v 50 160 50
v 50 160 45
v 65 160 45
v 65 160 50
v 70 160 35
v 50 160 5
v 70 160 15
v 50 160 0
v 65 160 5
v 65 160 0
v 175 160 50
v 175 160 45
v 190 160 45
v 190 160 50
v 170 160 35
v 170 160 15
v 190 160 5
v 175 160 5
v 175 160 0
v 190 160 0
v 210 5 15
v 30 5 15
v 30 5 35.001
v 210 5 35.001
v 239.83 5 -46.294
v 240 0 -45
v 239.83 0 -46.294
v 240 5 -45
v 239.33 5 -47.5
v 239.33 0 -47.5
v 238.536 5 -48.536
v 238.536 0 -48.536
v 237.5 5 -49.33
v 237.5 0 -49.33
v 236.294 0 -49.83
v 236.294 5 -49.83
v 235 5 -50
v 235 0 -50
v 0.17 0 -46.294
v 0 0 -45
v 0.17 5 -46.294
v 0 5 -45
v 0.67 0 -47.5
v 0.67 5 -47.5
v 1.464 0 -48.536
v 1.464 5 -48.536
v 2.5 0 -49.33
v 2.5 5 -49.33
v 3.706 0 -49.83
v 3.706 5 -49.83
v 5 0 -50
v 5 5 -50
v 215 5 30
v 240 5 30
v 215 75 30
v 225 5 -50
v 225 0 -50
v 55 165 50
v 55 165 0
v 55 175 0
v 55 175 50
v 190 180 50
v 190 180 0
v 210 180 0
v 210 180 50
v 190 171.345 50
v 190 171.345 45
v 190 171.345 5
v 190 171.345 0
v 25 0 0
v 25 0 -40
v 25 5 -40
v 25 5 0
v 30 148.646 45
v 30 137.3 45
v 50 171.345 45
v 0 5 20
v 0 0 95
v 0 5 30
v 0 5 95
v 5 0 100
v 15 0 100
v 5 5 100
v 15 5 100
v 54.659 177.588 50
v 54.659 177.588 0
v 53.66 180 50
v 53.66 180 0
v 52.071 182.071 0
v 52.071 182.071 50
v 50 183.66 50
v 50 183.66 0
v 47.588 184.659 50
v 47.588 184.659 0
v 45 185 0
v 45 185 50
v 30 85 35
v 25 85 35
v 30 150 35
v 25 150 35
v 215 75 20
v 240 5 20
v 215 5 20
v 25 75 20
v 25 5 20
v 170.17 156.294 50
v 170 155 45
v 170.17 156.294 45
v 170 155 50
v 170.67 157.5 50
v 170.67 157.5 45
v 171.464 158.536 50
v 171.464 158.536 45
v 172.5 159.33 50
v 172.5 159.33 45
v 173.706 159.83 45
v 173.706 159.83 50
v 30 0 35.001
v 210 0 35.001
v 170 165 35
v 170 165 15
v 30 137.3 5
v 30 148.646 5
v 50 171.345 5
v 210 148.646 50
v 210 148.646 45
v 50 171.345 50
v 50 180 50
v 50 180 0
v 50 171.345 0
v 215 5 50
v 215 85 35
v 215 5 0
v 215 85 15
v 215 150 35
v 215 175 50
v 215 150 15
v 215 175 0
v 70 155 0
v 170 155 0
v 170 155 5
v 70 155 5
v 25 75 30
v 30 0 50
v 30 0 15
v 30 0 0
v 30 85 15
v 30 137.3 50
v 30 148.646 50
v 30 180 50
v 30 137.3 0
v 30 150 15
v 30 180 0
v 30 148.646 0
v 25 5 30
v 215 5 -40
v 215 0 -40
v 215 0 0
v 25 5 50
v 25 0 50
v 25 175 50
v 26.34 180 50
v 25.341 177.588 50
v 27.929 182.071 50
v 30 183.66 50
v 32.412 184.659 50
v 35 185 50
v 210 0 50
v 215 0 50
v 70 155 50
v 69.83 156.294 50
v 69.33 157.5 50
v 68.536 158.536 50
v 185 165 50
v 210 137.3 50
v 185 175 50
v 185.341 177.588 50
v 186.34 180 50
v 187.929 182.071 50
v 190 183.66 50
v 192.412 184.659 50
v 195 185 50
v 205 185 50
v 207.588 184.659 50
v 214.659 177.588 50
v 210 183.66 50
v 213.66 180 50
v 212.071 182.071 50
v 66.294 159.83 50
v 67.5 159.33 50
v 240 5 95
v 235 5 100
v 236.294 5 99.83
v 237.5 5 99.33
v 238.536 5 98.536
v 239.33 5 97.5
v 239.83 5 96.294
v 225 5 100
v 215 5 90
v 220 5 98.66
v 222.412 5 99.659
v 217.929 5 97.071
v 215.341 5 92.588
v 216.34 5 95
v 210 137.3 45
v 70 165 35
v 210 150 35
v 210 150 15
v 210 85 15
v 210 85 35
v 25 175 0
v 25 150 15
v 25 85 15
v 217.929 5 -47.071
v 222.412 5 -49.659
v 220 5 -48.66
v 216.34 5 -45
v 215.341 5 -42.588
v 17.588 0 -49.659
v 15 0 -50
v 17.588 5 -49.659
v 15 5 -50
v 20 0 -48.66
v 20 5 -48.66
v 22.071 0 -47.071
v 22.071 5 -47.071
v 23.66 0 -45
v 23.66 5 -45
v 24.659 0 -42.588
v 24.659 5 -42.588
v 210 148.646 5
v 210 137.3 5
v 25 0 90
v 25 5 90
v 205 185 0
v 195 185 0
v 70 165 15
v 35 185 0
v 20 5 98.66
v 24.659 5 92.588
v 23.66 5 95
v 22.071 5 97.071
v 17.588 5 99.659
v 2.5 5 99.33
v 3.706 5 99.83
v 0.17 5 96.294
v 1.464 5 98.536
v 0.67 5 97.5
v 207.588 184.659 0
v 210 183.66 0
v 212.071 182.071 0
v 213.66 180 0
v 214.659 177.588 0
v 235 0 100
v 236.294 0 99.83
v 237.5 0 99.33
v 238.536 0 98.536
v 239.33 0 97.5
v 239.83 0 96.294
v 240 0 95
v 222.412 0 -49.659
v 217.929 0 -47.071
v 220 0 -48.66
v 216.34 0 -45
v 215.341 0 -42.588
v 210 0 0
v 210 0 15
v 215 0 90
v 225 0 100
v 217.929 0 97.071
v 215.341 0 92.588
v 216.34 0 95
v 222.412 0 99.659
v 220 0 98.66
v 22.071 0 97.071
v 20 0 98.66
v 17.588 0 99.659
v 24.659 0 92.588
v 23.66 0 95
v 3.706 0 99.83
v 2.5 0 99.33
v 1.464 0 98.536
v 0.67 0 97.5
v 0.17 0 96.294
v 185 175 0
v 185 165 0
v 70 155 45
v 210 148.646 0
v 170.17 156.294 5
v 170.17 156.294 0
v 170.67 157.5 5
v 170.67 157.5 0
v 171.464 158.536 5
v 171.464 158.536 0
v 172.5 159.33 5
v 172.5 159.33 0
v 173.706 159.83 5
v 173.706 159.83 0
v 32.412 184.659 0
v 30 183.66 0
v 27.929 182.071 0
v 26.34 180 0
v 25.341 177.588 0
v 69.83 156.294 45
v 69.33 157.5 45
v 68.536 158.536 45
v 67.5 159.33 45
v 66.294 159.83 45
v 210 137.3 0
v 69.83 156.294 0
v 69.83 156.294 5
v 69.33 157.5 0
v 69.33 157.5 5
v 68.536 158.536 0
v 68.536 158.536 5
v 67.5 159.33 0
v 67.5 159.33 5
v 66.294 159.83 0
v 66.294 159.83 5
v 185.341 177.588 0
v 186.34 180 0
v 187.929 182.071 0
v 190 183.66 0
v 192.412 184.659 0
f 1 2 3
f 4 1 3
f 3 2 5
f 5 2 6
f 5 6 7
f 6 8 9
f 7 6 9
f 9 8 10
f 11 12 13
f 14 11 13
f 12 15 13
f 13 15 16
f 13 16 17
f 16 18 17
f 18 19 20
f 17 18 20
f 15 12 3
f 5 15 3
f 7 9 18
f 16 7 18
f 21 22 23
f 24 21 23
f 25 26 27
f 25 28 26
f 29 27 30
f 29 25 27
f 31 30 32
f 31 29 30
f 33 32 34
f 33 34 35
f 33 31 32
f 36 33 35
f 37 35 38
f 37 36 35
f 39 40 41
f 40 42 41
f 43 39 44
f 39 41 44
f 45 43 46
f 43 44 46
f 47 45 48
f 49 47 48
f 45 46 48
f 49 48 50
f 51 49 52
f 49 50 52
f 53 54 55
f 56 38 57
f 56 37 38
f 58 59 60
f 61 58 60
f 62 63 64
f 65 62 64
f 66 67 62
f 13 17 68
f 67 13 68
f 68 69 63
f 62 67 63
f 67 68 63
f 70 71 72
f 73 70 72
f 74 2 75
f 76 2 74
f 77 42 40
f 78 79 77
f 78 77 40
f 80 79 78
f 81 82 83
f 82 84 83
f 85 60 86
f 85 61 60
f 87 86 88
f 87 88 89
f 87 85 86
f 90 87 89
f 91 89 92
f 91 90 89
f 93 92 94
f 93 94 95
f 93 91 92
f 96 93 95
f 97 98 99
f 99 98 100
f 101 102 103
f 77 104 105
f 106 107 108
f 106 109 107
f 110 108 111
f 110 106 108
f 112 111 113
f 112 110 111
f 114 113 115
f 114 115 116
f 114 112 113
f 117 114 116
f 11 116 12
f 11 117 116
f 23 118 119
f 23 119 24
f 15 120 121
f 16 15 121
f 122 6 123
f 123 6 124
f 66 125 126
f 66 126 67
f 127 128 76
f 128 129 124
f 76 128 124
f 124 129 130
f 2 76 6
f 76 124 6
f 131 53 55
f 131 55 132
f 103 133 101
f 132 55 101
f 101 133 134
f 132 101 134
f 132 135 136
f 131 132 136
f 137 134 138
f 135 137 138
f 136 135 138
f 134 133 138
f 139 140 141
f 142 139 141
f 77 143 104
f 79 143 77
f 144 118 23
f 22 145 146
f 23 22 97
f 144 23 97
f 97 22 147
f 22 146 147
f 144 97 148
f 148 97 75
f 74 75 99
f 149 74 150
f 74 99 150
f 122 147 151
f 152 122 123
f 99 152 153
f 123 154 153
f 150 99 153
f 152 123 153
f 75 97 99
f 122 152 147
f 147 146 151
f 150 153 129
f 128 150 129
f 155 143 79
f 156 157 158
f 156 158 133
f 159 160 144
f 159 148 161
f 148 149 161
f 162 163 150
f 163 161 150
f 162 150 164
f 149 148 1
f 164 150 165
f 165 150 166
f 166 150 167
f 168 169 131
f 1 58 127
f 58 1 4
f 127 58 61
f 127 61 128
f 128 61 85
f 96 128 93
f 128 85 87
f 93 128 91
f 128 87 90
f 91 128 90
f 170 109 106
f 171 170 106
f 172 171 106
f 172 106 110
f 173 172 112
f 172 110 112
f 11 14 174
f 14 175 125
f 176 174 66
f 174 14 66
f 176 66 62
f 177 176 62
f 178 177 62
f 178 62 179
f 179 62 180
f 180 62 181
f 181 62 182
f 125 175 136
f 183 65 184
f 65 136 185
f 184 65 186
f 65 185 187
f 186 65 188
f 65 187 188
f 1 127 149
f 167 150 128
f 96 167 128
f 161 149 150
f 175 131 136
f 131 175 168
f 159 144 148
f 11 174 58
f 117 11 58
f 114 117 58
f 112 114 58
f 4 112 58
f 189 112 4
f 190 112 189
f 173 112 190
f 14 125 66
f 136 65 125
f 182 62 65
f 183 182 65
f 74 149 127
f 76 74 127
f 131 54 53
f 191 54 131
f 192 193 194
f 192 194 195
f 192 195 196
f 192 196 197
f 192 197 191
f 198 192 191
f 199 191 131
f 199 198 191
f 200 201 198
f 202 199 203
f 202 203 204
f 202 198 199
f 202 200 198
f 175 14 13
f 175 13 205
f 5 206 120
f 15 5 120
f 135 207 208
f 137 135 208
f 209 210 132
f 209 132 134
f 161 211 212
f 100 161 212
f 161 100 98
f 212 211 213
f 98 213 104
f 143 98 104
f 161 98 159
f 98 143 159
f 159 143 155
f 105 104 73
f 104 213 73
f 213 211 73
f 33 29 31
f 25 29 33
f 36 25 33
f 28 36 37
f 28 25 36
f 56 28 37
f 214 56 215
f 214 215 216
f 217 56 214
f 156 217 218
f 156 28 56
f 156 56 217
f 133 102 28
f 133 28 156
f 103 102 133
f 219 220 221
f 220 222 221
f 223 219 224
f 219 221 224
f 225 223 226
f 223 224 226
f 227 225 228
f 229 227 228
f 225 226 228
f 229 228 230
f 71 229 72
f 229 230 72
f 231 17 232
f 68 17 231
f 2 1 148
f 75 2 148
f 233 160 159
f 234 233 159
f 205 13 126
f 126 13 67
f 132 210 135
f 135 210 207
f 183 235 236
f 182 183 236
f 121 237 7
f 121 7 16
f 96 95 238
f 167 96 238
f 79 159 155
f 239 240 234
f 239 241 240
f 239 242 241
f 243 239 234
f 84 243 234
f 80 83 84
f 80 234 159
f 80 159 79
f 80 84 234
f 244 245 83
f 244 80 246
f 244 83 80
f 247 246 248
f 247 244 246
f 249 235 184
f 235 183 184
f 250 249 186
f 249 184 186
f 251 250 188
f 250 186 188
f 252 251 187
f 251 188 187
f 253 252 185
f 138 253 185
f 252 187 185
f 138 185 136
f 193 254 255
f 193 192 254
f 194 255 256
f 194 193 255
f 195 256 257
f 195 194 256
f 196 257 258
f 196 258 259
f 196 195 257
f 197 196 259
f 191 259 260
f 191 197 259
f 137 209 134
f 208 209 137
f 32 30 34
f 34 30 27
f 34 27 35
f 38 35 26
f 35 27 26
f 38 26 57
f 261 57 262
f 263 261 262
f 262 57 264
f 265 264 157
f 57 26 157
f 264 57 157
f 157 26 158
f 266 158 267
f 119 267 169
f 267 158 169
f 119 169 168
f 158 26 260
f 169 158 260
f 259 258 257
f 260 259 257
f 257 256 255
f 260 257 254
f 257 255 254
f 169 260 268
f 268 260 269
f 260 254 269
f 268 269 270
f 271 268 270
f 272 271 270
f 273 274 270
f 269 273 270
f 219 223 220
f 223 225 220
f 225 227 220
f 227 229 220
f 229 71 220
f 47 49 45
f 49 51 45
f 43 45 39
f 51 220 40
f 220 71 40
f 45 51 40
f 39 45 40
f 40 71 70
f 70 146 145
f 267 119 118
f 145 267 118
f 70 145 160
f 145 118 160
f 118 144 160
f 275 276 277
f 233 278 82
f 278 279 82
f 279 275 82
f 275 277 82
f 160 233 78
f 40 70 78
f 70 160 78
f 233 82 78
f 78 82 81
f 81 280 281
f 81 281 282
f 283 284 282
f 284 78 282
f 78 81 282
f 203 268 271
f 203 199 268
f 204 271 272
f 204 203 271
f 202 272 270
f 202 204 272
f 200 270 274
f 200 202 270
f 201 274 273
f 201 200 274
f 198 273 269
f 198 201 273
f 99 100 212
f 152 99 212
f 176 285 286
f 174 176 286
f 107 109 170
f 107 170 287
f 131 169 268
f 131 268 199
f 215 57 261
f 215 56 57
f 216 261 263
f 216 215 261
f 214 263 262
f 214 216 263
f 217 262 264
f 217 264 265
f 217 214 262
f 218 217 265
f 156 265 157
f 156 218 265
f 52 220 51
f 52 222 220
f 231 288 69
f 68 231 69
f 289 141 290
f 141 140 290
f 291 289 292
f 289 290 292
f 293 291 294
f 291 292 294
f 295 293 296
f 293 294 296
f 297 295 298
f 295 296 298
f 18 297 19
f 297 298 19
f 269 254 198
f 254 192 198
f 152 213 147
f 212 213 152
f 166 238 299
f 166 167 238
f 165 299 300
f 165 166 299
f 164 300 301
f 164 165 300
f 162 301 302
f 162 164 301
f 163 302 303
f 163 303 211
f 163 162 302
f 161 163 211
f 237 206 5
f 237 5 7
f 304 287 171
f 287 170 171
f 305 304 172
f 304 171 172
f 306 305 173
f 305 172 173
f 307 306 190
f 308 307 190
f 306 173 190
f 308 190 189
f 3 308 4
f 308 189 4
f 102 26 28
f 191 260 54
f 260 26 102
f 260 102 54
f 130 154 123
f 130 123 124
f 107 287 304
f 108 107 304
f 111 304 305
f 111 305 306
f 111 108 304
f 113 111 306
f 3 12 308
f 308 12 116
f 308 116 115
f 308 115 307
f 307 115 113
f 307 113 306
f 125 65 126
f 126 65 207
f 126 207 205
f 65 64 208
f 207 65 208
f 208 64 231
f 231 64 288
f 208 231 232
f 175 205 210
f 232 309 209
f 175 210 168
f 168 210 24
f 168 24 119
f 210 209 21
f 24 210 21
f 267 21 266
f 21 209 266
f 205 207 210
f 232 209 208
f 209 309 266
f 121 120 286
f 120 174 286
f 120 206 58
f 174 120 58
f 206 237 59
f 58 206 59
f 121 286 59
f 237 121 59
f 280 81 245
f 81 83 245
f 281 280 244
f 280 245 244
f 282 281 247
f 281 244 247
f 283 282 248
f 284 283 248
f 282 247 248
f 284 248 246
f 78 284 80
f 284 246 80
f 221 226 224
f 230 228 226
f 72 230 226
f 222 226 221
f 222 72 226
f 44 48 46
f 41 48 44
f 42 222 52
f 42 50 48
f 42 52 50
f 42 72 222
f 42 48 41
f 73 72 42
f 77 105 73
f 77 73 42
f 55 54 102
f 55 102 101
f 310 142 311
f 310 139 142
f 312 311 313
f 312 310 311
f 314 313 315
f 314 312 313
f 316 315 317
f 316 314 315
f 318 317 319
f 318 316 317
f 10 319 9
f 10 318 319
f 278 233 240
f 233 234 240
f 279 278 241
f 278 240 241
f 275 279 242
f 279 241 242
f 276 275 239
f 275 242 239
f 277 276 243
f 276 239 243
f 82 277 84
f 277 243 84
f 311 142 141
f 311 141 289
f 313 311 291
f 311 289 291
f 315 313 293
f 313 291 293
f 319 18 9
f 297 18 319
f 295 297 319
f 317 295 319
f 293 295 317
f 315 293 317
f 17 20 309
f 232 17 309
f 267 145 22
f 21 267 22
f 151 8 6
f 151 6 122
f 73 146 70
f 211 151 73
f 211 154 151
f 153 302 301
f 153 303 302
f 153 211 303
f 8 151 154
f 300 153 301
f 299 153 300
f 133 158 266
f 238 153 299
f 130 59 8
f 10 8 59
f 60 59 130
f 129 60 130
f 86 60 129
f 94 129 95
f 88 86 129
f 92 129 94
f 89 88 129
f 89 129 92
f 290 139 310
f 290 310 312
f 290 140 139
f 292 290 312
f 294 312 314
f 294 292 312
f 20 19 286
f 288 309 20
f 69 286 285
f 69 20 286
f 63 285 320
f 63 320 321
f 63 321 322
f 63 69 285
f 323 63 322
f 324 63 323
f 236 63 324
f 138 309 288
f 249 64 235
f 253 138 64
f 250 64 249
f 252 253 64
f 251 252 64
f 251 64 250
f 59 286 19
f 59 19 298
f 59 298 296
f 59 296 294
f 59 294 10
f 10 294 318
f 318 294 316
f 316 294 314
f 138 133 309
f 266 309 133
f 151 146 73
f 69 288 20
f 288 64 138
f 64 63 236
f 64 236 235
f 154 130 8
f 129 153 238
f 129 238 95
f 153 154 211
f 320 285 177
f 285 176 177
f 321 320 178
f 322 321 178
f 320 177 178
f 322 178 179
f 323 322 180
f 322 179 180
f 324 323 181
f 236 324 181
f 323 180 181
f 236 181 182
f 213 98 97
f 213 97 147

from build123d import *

# Parameters (mm, degrees)
EXTRUDE_1_DEPTH             = 50
SKETCH_2_W                  = 20.000664015
SKETCH_2_H                  = 5
EXTRUDE_2_DEPTH             = 240
EXTRUDE_3_DEPTH             = 50
EXTRUDE_3_DEPTH_BACK        = 100
SKETCH_3_W                  = 25
SKETCH_3_H                  = 5
RIB_2_REACH                 = 314.17
SKETCH_4_WALL_W             = 700.669994888
SKETCH_4_WALL_H             = 10
RIB_3_REACH                 = 314.17
SKETCH_5_WALL_W             = 700.669994888
SKETCH_5_WALL_H             = 10
CUT_EXTRUDE_START           = -190
SKETCH_6_W                  = 20
SKETCH_6_H                  = 65
CUT_EXTRUDE_1_DEPTH         = 190
SKETCH_7_W                  = 100
SKETCH_7_H                  = 20
CUT_EXTRUDE_2_DEPTH         = 5
EXTRUDE_5_DEPTH             = 5
MIRROR_2_COPY_1_DEPTH       = 5
EXTRUDE_6_REACH             = 244.126
SKETCH_10_W                 = 5
SKETCH_10_H                 = 5
EXTRUDE_6_DIRECTION_2_REACH = 244.126
FILLET_1_R                  = 5
FILLET_2_R                  = 5
FILLET_3_R                  = 5
FILLET_4_R                  = 5
FILLET_5_R                  = 10
FILLET_6_R                  = 5


with BuildPart() as part:
    # 草图1 → 凸台-拉伸1 (new body)
    with BuildSketch(Plane.XY):
        Polygon((0, 0), (30, 0), (30, 180), (50, 180), (50, 160), (190, 160), (190, 180), (210, 180), (210, 0), (240, 0), (240, 5), (215, 5), (215, 185), (185, 185), (185, 165), (55, 165), (55, 185), (25, 185), (25, 5), (0, 5), align=None)
    extrude(amount=EXTRUDE_1_DEPTH)

    # 草图2 → 凸台-拉伸2 (add)
    with BuildSketch(Plane.ZY):
        with Locations((25.000332008, 2.5)):
            Rectangle(SKETCH_2_W, SKETCH_2_H)
    extrude(amount=-EXTRUDE_2_DEPTH)

    # 草图3 → 凸台-拉伸3 (add, two sides: drawn at the far end of the back side and taken through both)
    with BuildSketch(Plane(origin=(0, 0, 0), x_dir=(-1, 0, 0), z_dir=(0, 0, -1)).offset(-EXTRUDE_3_DEPTH_BACK)):
        with Locations((-227.5, 2.5)):
            Rectangle(SKETCH_3_W, SKETCH_3_H)
        with Locations((-12.5, 2.5)):
            Rectangle(SKETCH_3_W, SKETCH_3_H)
    extrude(amount=EXTRUDE_3_DEPTH + EXTRUDE_3_DEPTH_BACK)

    # 草图4 wall → 筋2 (add, up to next)
    with BuildSketch(Plane(origin=(227.5, 40, 25), x_dir=(-0.336336396998, 0.941741911595, 0), z_dir=(0.941741911595, 0.336336396998, 0)), mode=Mode.PRIVATE) as rib_2_sk1:
        Rectangle(SKETCH_4_WALL_W, SKETCH_4_WALL_H)
    rib_2_tool1 = extrude(rib_2_sk1.sketch, amount=-RIB_2_REACH, mode=Mode.PRIVATE) - part.part
    add(rib_2_tool1.solids().sort_by_distance((227.5, 40, 25))[0])

    # 草图5 wall → 筋3 (add, up to next)
    with BuildSketch(Plane(origin=(12.5, 40, 25), x_dir=(-0.336336396998, -0.941741911595, 0), z_dir=(-0.941741911595, 0.336336396998, 0)), mode=Mode.PRIVATE) as rib_3_sk1:
        Rectangle(SKETCH_5_WALL_W, SKETCH_5_WALL_H)
    rib_3_tool1 = extrude(rib_3_sk1.sketch, amount=-RIB_3_REACH, mode=Mode.PRIVATE) - part.part
    add(rib_3_tool1.solids().sort_by_distance((12.5, 40, 25))[0])

    # 草图6 → 切除-拉伸1 (cut)
    with BuildSketch(Plane(origin=(215, 0, 0), x_dir=(0, 0, -1), z_dir=(1, 0, 0)).offset(CUT_EXTRUDE_START)):
        with Locations((-25, 117.5)):
            Rectangle(SKETCH_6_W, SKETCH_6_H)
    extrude(amount=CUT_EXTRUDE_1_DEPTH, mode=Mode.SUBTRACT)

    # 草图7 → 切除-拉伸2 (cut)
    with BuildSketch(Plane(origin=(0, 165, 0), x_dir=(1, 0, 0), z_dir=(0, 1, 0))):
        with Locations((120, -25)):
            Rectangle(SKETCH_7_W, SKETCH_7_H)
    extrude(amount=-CUT_EXTRUDE_2_DEPTH, mode=Mode.SUBTRACT)

    # 草图9 → 凸台-拉伸5 (add)
    with BuildSketch(Plane(origin=(0, 0, 0), x_dir=(-1, 0, 0), z_dir=(0, 0, -1))):
        Polygon((-190, 160), (-210, 137.300480815), (-210, 148.645505565), (-190, 171.34502475), align=None)
    extrude_5 = extrude(amount=-EXTRUDE_5_DEPTH)

    # 镜向1: 凸台-拉伸5 across plane
    add(extrude_5.mirror(Plane(origin=(0, 0, 25), x_dir=(1, 0, 0), z_dir=(0, 0, -1))))

    # 镜向2: 凸台-拉伸5 across plane
    add(extrude_5.mirror(Plane(origin=(120, 0, 0), x_dir=(0, 0, 1), z_dir=(1, 0, 0))))

    # 镜向2 copy 1 sketch → 镜向2 copy 1 (add)
    with BuildSketch(Plane(origin=(240, 0, 50), x_dir=(1, 0, 0), z_dir=(0, 0, 1))):
        Polygon((-190, 160), (-210, 137.300480815), (-210, 148.645505565), (-190, 171.34502475), align=None)
    extrude(amount=-MIRROR_2_COPY_1_DEPTH)

    # 凸台-拉伸6: up to this face of the body (flat: up to its plane)
    extrude_6_end = Plane(part.part.faces().sort_by_distance((170, 162.5, 25))[0])
    # 草图10 → 凸台-拉伸6 (add, up to the picked face)
    with BuildSketch(Plane(origin=(120, 0, 0), x_dir=(0, 0, -1), z_dir=(1, 0, 0)), mode=Mode.PRIVATE) as extrude_6_sk1:
        with Locations((-47.5, 157.5)):
            Rectangle(SKETCH_10_W, SKETCH_10_H)
    extrude_6_tool1 = split(extrude(extrude_6_sk1.sketch, amount=EXTRUDE_6_REACH, mode=Mode.PRIVATE), bisect_by=extrude_6_end, keep=Keep.BOTH, mode=Mode.PRIVATE)
    extrude_6 = extrude_6_tool1.solids().sort_by(Axis((120, 157.5, 47.5), (1, 0, 0)))[0]
    add(extrude_6)

    # 凸台-拉伸6 direction 2: up to this face of the body (flat: up to its plane)
    extrude_6_direction_2_end = Plane(part.part.faces().sort_by_distance((70, 162.5, 25))[0])
    # 草图10 → 凸台-拉伸6 direction 2 (add, up to the picked face)
    with BuildSketch(Plane(origin=(120, 0, 0), x_dir=(0, 0, -1), z_dir=(1, 0, 0)), mode=Mode.PRIVATE) as extrude_6_direction_2_sk1:
        with Locations((-47.5, 157.5)):
            Rectangle(SKETCH_10_W, SKETCH_10_H)
    extrude_6_direction_2_tool1 = split(extrude(extrude_6_direction_2_sk1.sketch, amount=-EXTRUDE_6_DIRECTION_2_REACH, mode=Mode.PRIVATE), bisect_by=extrude_6_direction_2_end, keep=Keep.BOTH, mode=Mode.PRIVATE)
    extrude_6_direction_2 = extrude_6_direction_2_tool1.solids().sort_by(Axis((120, 157.5, 47.5), (-1, 0, 0)))[0]
    add(extrude_6_direction_2)

    # 镜向3: 凸台-拉伸6, 凸台-拉伸6 direction 2 across plane
    add(extrude_6.mirror(Plane(origin=(0, 0, 25), x_dir=(1, 0, 0), z_dir=(0, 0, -1))))
    add(extrude_6_direction_2.mirror(Plane(origin=(0, 0, 25), x_dir=(1, 0, 0), z_dir=(0, 0, -1))))

    # 圆角1
    fillet_1_edges = [part.edges().sort_by_distance(p)[0] for p in [
        (70, 160, 47.5),
    ]]
    fillet(fillet_1_edges, radius=FILLET_1_R - 0.0001)  # a hair under: the kernel refuses the full size

    # 圆角2
    fillet_2_edges = [part.edges().sort_by_distance(p)[0] for p in [
        (170, 160, 47.5),
    ]]
    fillet(fillet_2_edges, radius=FILLET_2_R - 0.0001)  # a hair under: the kernel refuses the full size

    # 圆角3
    fillet_3_edges = [part.edges().sort_by_distance(p)[0] for p in [
        (170, 160, 2.5),
    ]]
    fillet(fillet_3_edges, radius=FILLET_3_R - 0.0001)  # a hair under: the kernel refuses the full size

    # 圆角4
    fillet_4_edges = [part.edges().sort_by_distance(p)[0] for p in [
        (70, 160, 2.5),
    ]]
    fillet(fillet_4_edges, radius=FILLET_4_R - 0.0001)  # a hair under: the kernel refuses the full size

    # 圆角5
    fillet_5_edges = [part.edges().sort_by_distance(p)[0] for p in [
        (215, 2.5, 100),
        (215, 2.5, -50),
        (25, 2.5, 100),
        (25, 2.5, -50),
        (25, 185, 25),
        (55, 185, 25),
        (185, 185, 25),
        (215, 185, 25),
    ]]
    fillet(fillet_5_edges, radius=FILLET_5_R)

    # 圆角6
    fillet_6_edges = [part.edges().sort_by_distance(p)[0] for p in [
        (240, 2.5, 100),
        (240, 2.5, -50),
        (0, 2.5, 100),
        (0, 2.5, -50),
    ]]
    fillet(fillet_6_edges, radius=FILLET_6_R)


solid = part.part
